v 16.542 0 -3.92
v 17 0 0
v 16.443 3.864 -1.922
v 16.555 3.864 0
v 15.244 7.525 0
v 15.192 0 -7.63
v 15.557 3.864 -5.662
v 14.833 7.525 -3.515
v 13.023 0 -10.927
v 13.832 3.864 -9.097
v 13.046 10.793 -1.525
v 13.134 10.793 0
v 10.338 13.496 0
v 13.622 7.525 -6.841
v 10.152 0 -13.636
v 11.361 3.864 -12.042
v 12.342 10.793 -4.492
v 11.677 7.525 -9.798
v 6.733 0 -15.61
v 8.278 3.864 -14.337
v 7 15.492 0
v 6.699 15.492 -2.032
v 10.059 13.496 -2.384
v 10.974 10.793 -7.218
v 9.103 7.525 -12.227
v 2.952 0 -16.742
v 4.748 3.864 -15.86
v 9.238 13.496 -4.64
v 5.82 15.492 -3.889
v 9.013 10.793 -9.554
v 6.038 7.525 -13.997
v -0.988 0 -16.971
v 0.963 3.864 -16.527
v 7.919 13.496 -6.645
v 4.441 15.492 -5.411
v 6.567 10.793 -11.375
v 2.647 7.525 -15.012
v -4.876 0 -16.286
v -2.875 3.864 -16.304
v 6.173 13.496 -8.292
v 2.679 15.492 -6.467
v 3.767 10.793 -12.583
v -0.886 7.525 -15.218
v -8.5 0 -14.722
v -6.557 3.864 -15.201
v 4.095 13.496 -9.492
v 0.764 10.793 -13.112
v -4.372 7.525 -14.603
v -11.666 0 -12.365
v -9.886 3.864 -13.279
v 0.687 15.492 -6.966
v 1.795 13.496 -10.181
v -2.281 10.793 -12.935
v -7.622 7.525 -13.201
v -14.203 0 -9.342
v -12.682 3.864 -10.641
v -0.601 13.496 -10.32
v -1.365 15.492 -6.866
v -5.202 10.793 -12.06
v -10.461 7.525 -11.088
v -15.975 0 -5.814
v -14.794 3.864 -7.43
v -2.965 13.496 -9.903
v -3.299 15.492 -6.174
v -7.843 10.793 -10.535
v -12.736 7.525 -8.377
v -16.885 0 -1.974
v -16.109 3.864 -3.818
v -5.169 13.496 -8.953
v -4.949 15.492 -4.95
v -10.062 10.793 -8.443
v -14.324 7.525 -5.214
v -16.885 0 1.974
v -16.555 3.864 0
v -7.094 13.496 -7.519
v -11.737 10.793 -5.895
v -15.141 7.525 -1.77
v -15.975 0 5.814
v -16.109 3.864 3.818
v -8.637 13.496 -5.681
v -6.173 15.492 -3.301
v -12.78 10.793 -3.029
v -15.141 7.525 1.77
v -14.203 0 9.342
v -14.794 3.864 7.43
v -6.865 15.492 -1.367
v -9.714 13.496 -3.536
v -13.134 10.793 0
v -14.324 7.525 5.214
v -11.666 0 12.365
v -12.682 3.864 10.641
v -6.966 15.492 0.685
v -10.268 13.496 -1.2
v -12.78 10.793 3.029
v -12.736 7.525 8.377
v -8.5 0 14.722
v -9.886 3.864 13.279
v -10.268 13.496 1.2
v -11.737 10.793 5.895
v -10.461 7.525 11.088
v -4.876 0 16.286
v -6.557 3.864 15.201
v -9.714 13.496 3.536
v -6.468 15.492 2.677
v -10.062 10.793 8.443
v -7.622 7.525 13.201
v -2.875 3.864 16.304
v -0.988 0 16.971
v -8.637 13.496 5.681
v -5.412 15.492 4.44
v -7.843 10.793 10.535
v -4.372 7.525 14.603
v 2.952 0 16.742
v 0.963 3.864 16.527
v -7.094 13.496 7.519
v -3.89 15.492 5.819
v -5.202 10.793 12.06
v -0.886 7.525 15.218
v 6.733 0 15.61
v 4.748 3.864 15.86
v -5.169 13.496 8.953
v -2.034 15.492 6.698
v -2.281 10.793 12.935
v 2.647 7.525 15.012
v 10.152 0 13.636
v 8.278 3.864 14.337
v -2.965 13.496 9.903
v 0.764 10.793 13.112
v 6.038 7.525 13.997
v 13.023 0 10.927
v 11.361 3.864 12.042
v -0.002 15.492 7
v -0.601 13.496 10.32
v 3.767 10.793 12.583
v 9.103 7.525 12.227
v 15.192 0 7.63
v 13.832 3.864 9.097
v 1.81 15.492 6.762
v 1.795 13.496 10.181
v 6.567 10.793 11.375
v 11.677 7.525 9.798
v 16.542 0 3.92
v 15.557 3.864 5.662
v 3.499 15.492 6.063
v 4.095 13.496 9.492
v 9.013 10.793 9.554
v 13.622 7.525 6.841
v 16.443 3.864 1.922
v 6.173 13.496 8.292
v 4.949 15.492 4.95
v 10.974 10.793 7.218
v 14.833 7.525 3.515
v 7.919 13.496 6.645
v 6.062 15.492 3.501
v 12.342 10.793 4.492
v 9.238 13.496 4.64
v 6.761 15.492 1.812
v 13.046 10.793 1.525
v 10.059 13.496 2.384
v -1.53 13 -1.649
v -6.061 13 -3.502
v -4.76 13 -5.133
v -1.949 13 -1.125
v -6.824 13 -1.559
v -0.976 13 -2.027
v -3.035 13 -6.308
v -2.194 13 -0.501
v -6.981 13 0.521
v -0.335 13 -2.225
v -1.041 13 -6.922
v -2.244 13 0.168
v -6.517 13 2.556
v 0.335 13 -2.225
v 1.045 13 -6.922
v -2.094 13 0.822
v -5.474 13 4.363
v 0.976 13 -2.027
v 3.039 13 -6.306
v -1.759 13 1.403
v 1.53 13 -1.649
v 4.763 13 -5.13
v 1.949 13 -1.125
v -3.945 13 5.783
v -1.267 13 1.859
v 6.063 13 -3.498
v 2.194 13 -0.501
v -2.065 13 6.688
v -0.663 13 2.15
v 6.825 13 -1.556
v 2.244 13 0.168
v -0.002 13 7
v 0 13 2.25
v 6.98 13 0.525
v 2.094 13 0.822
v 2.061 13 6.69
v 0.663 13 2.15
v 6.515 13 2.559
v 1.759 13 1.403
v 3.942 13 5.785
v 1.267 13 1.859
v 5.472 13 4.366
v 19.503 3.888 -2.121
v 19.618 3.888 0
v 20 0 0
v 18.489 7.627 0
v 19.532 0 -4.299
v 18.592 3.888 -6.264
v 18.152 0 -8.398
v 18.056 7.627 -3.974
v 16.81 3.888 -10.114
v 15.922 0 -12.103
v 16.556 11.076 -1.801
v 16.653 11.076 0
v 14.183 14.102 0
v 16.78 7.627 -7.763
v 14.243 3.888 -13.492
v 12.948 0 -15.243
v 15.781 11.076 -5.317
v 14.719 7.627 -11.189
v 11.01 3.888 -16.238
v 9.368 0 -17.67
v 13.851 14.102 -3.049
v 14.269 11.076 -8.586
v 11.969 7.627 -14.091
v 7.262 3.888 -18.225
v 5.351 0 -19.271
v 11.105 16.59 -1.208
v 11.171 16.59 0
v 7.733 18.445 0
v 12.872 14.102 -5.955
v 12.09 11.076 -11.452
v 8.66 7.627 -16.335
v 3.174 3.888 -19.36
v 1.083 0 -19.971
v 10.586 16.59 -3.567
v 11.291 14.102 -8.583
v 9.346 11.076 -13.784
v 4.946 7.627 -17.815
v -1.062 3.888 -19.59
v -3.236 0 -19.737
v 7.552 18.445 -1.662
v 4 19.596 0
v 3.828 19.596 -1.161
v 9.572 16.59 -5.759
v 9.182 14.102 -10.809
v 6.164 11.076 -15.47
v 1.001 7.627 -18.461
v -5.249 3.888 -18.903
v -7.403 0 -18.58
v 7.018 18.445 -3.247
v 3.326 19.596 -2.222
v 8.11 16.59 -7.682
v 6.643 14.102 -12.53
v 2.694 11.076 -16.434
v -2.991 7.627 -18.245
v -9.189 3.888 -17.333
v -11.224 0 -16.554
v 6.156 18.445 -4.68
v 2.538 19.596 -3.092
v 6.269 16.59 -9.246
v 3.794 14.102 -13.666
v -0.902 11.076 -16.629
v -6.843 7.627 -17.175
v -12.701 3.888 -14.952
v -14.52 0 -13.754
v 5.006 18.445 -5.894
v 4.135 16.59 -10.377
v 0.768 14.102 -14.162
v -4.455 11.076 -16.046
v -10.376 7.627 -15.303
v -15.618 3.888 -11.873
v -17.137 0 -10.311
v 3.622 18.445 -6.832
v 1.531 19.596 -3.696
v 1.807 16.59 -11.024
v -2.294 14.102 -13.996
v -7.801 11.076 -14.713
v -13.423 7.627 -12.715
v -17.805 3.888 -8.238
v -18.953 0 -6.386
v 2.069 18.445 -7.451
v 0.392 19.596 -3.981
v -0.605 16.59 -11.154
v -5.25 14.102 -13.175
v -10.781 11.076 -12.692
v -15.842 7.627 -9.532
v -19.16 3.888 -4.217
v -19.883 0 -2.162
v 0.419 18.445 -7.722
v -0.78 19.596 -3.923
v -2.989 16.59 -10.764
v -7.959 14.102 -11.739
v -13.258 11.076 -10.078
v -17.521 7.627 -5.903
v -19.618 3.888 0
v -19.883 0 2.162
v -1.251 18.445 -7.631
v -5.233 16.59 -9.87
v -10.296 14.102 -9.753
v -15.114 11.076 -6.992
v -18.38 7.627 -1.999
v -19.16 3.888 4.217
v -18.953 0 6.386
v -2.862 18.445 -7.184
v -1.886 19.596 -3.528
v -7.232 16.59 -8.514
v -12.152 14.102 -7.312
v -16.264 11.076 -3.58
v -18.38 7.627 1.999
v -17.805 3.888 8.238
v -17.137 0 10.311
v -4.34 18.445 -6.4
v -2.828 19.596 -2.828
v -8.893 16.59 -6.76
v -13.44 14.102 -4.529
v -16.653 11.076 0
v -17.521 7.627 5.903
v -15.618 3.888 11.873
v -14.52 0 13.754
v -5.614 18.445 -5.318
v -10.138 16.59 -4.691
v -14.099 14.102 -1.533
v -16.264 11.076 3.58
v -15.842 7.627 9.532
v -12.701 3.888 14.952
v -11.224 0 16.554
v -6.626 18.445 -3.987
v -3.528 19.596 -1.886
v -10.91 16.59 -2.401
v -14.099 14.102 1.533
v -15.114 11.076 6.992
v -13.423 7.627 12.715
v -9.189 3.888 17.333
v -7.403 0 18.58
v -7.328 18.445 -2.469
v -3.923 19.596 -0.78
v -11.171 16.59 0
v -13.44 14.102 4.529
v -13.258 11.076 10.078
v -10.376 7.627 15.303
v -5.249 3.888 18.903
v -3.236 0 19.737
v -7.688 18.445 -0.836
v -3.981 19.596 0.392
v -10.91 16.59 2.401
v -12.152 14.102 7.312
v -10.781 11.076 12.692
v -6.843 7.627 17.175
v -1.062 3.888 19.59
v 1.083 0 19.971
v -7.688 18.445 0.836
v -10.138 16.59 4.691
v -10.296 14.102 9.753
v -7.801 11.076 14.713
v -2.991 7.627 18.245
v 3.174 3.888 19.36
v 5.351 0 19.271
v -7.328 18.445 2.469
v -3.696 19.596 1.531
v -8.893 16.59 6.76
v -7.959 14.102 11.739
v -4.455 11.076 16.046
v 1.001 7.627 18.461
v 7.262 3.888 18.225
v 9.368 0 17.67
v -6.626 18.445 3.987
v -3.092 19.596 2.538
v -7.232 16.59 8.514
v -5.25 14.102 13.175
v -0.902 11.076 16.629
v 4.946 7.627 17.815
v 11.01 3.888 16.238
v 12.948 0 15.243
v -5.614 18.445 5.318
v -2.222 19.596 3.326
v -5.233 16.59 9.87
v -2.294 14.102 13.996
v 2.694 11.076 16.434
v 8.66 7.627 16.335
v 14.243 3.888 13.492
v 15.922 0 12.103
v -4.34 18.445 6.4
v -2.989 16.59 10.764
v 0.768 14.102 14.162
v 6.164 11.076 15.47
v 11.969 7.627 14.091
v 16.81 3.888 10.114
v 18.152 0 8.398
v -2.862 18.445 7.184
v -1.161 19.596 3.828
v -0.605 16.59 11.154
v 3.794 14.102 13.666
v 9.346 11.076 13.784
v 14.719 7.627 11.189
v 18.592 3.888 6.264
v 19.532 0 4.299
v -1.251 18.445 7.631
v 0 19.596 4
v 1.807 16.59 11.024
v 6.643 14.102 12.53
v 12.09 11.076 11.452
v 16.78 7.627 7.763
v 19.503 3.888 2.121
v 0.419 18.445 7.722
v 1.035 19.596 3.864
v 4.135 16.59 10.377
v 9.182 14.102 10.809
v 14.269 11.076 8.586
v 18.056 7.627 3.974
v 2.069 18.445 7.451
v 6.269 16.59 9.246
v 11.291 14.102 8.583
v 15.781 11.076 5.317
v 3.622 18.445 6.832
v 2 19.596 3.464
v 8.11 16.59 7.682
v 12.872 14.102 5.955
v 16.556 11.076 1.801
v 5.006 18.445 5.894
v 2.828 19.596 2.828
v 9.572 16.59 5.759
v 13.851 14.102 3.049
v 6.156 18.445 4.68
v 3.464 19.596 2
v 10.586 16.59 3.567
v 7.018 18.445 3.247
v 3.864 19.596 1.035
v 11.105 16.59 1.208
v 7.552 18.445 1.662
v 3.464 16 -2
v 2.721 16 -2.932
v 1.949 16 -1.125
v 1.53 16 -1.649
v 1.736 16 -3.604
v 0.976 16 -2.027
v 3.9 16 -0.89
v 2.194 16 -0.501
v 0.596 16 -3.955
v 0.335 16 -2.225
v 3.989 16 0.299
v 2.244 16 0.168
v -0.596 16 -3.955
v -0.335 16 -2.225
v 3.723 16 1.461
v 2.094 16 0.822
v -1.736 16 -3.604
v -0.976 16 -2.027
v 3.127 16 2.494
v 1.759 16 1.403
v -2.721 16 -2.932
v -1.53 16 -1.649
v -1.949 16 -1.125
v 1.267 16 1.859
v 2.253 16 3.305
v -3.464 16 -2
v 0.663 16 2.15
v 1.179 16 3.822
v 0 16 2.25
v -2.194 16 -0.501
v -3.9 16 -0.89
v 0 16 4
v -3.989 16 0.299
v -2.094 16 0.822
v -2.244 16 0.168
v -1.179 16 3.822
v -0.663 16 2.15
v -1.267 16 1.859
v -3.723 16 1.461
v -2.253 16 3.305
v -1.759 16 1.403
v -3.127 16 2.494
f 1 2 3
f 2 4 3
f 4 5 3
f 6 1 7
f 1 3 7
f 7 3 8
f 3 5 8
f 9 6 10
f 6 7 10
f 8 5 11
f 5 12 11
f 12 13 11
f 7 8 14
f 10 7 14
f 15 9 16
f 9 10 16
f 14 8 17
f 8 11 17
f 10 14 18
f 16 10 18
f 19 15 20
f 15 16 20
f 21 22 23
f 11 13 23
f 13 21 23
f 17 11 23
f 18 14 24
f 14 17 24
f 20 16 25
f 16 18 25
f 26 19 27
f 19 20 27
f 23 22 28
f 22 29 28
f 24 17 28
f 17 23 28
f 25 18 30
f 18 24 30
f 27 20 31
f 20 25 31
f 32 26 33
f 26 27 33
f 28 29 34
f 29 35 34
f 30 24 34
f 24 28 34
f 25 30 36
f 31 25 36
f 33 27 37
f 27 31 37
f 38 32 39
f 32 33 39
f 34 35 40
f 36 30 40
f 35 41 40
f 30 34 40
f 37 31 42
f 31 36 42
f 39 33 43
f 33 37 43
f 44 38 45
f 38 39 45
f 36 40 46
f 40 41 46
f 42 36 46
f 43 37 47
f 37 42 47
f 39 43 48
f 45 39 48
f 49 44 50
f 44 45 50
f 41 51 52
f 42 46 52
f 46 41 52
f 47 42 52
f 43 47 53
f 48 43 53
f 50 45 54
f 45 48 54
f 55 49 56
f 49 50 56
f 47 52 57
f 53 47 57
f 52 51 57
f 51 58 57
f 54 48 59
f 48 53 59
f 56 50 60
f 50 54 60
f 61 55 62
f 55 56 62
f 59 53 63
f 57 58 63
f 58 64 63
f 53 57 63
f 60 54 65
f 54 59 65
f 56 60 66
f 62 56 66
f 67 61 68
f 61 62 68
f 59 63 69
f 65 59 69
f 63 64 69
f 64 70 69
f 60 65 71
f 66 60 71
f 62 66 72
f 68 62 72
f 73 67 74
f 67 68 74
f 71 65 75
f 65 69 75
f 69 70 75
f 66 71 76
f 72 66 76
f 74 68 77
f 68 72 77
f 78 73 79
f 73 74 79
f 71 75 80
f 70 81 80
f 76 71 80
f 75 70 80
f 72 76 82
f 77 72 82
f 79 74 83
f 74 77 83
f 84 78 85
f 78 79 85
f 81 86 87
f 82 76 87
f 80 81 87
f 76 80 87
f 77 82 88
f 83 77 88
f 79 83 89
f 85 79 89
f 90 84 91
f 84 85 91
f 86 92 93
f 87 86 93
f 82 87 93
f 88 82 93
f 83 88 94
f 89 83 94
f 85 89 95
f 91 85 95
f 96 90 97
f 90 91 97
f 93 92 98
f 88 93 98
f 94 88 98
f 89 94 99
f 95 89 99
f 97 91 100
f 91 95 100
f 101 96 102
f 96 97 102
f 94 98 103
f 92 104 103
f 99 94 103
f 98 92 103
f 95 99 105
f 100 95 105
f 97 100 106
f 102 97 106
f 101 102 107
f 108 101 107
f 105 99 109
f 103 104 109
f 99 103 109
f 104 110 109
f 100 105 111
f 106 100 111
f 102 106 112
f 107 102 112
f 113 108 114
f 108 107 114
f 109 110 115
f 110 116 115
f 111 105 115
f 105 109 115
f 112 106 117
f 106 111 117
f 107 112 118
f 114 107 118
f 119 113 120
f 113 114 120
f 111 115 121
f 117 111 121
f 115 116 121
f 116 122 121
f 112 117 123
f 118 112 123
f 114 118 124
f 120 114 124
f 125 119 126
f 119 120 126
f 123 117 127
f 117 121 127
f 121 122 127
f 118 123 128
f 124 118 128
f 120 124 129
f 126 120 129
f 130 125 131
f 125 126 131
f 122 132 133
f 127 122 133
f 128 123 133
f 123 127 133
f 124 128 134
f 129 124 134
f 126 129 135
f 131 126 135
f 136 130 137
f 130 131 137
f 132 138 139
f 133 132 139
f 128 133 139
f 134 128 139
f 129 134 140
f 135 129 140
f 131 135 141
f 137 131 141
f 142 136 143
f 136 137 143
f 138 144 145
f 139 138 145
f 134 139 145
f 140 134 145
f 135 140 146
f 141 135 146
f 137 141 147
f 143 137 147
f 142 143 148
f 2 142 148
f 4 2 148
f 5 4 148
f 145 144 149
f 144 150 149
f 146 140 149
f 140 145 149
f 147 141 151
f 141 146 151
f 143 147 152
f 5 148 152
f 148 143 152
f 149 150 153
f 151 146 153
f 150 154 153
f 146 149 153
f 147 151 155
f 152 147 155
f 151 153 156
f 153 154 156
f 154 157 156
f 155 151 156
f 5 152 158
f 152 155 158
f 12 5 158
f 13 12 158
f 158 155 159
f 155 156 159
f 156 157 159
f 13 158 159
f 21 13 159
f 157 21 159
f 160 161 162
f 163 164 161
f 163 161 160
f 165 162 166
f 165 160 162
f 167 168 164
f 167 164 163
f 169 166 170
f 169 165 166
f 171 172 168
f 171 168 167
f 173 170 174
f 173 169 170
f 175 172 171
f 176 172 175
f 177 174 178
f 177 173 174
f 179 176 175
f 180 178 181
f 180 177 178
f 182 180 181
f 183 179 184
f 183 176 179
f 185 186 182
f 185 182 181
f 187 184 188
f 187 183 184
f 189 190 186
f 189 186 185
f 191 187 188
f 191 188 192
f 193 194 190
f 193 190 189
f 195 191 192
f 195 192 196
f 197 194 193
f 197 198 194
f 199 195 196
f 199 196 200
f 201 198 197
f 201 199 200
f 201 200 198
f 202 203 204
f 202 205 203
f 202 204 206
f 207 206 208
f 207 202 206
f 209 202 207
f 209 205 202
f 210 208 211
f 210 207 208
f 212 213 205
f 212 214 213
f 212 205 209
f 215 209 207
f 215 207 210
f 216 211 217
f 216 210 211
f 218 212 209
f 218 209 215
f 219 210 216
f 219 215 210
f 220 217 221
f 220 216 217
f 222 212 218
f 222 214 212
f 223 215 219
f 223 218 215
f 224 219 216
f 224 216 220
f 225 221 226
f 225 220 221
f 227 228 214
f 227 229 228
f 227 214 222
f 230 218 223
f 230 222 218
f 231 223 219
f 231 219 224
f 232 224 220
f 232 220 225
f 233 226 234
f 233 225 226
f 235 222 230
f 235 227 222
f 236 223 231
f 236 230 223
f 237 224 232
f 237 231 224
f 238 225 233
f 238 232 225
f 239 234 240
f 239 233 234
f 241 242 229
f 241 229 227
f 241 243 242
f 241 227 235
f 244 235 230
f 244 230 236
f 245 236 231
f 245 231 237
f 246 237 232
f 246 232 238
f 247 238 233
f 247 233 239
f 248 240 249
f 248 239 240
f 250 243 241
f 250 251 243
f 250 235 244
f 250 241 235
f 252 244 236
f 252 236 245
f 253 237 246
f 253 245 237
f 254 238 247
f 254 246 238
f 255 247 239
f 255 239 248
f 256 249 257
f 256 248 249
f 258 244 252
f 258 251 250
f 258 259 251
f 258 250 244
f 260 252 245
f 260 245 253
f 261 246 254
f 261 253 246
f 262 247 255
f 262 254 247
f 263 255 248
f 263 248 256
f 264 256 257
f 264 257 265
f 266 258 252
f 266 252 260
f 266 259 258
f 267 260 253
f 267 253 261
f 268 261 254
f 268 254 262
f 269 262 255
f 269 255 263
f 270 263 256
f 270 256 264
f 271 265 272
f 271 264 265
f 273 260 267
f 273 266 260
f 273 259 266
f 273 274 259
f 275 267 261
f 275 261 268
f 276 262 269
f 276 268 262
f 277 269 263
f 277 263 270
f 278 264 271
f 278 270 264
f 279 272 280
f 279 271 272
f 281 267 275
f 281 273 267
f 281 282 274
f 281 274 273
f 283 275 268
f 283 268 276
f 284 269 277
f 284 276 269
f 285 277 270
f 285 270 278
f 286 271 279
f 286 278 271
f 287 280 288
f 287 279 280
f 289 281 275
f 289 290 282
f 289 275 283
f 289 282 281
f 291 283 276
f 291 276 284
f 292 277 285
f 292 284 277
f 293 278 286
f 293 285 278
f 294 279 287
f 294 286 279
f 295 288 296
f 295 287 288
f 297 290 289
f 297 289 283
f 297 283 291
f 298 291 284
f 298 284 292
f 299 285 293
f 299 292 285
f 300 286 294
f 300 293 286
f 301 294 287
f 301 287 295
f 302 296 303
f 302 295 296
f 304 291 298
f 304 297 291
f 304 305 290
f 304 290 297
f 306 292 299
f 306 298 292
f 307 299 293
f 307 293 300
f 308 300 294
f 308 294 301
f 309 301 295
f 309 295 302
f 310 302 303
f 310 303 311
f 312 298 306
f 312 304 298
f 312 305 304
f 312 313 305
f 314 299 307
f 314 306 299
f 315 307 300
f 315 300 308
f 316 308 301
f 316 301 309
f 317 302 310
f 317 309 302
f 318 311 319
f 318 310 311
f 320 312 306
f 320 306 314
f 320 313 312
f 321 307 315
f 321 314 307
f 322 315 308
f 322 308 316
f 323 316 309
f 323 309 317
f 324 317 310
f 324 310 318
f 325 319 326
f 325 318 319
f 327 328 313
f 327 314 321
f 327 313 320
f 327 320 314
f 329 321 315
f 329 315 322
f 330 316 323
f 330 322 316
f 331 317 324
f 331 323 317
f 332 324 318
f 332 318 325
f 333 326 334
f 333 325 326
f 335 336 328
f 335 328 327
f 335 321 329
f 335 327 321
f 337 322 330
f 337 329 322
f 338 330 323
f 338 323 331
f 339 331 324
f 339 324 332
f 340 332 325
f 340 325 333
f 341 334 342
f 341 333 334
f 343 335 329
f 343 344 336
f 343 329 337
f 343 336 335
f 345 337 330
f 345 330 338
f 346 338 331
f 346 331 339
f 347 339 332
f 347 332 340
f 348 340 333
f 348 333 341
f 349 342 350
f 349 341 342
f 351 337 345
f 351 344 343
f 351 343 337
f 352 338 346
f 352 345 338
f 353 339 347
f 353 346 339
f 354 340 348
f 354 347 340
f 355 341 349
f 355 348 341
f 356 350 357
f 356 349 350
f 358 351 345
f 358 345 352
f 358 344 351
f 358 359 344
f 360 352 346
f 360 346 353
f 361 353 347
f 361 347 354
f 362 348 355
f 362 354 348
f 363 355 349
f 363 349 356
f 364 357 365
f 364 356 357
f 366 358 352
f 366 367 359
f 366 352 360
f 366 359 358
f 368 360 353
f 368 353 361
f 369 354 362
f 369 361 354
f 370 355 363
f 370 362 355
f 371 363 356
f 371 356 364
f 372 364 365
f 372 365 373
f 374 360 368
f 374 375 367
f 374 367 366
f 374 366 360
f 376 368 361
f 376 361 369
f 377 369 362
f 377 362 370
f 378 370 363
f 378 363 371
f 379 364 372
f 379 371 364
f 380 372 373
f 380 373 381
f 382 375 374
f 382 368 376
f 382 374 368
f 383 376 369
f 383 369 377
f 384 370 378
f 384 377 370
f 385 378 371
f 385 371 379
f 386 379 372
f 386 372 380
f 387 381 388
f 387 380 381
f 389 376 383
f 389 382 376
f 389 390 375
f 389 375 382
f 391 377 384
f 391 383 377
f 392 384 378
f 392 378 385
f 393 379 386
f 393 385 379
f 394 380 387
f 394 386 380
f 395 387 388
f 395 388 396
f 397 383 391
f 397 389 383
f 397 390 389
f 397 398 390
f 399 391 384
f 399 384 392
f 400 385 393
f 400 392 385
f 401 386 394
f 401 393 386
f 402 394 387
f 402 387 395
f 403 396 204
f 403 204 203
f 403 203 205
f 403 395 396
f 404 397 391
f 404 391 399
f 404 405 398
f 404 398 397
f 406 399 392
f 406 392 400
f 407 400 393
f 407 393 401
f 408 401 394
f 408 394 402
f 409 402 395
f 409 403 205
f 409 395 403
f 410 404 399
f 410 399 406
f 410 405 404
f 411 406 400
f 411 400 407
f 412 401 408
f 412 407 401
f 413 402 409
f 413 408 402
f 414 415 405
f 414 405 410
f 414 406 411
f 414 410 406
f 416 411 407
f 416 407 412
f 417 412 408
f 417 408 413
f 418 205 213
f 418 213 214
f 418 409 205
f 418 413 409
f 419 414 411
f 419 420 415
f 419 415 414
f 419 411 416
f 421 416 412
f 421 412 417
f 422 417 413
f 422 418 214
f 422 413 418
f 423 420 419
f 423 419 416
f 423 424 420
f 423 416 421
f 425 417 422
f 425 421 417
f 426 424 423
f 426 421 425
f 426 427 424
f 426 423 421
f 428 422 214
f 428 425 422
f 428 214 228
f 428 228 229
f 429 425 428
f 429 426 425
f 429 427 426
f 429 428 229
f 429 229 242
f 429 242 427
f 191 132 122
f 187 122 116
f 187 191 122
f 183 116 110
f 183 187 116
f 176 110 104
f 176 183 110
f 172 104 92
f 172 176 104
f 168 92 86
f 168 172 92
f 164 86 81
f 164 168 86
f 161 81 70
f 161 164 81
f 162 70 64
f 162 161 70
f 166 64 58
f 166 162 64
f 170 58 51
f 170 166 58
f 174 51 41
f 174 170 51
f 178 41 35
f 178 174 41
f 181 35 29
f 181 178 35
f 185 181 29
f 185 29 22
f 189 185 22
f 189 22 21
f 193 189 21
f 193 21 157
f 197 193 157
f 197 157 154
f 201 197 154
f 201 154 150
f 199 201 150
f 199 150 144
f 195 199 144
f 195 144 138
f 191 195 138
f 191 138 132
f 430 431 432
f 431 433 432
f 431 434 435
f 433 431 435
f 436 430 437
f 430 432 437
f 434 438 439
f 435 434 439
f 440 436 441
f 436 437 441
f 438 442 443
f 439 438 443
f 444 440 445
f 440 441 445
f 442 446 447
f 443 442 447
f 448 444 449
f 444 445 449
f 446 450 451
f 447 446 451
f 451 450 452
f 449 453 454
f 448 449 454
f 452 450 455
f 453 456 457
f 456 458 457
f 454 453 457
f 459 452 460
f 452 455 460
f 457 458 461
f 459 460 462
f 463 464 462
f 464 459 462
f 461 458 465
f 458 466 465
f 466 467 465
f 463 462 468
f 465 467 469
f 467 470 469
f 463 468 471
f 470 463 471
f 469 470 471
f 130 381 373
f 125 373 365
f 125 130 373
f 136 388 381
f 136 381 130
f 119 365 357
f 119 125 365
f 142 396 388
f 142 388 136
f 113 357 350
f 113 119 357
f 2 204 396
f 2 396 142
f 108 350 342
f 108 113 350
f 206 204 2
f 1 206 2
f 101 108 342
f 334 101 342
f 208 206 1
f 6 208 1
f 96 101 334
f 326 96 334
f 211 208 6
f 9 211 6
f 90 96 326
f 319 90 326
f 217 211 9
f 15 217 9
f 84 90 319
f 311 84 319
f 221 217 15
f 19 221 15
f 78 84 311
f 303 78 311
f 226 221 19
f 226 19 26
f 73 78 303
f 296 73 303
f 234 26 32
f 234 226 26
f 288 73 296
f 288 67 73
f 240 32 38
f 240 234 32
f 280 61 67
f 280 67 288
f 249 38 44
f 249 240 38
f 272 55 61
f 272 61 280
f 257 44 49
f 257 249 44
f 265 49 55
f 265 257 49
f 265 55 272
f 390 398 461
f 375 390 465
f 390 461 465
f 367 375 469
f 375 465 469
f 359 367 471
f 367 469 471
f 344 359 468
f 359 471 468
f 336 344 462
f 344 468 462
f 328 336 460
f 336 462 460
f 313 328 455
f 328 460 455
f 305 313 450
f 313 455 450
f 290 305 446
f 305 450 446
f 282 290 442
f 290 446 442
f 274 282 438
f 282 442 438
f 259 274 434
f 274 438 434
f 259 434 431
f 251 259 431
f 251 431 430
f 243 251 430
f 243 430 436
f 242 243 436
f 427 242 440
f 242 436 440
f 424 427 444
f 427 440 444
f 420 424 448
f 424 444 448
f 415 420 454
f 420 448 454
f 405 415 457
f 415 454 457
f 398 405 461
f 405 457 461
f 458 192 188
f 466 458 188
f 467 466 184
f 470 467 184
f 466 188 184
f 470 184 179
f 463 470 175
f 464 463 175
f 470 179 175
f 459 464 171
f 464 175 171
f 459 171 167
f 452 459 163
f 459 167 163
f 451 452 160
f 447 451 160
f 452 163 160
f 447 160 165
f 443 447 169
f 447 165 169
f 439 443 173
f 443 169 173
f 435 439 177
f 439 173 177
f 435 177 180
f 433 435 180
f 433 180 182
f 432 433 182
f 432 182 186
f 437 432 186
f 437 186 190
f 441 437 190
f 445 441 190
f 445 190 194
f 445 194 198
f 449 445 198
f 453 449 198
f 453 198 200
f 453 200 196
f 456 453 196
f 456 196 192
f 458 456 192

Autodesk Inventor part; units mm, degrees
ref_plane "YZ Plane" through (0, 0, 0) normal (1, 0, 0) x (0, 1, 0)
ref_plane "XY Plane" through (0, 0, 0) normal (0, 0, 1) x (1, 0, 0)
sketch "Sketch1" plane through (0, 0, 0) normal (0, 0, 1) x (1, 0, 0)
  line L0 (0, 0) -> (0, 20)
  line L1 (0, 0) -> (20, 0)
  arc A0 (20, 0) -> (0, 20) centre (0, 0) ccw
  line L2 (0, -4.8284) -> (0, 28.9706) projected
  dimension "d2" = 20
revolve "Revolution1" add sketch "Sketch1" angle 360 about axis through (0, -10, 0) along (0, 1, 0)
ref_plane "Work Plane1" through (0, 20, 0) normal (0, 1, 0) x (-1, 0, 0)
sketch "Sketch2" plane through (0, 20, 0) normal (0, 1, 0) x (-1, 0, 0)
  point P0 (0, 0)
  point P1 (0, 0)
hole "Hole1" at (0, 20, 0) direction (0, -1, 0) diameter 4.5 end through all counterbore diameter 8 counterbore depth 4 clearance for "Socket Head Cap Screw" size "M4" standard "Ansi Metric M Profile"
shell "Shell1" thickness 3 removed faces 1 at (13.8841, 0, 1.6858)
sketch "Sketch3" plane through (0, 0, 0) normal (0, -1, 0) x (1, 0, 0)
  circle A0 centre (0, 0) radius 5.25 projected
  circle A1 centre (0, 0) radius 2.25 projected
extrude "Extrusion1" cut sketch "Sketch3" against normal up to surface (13 mm away)
properties part number "Ball_Upper Half" material "Nylon 6/6"
